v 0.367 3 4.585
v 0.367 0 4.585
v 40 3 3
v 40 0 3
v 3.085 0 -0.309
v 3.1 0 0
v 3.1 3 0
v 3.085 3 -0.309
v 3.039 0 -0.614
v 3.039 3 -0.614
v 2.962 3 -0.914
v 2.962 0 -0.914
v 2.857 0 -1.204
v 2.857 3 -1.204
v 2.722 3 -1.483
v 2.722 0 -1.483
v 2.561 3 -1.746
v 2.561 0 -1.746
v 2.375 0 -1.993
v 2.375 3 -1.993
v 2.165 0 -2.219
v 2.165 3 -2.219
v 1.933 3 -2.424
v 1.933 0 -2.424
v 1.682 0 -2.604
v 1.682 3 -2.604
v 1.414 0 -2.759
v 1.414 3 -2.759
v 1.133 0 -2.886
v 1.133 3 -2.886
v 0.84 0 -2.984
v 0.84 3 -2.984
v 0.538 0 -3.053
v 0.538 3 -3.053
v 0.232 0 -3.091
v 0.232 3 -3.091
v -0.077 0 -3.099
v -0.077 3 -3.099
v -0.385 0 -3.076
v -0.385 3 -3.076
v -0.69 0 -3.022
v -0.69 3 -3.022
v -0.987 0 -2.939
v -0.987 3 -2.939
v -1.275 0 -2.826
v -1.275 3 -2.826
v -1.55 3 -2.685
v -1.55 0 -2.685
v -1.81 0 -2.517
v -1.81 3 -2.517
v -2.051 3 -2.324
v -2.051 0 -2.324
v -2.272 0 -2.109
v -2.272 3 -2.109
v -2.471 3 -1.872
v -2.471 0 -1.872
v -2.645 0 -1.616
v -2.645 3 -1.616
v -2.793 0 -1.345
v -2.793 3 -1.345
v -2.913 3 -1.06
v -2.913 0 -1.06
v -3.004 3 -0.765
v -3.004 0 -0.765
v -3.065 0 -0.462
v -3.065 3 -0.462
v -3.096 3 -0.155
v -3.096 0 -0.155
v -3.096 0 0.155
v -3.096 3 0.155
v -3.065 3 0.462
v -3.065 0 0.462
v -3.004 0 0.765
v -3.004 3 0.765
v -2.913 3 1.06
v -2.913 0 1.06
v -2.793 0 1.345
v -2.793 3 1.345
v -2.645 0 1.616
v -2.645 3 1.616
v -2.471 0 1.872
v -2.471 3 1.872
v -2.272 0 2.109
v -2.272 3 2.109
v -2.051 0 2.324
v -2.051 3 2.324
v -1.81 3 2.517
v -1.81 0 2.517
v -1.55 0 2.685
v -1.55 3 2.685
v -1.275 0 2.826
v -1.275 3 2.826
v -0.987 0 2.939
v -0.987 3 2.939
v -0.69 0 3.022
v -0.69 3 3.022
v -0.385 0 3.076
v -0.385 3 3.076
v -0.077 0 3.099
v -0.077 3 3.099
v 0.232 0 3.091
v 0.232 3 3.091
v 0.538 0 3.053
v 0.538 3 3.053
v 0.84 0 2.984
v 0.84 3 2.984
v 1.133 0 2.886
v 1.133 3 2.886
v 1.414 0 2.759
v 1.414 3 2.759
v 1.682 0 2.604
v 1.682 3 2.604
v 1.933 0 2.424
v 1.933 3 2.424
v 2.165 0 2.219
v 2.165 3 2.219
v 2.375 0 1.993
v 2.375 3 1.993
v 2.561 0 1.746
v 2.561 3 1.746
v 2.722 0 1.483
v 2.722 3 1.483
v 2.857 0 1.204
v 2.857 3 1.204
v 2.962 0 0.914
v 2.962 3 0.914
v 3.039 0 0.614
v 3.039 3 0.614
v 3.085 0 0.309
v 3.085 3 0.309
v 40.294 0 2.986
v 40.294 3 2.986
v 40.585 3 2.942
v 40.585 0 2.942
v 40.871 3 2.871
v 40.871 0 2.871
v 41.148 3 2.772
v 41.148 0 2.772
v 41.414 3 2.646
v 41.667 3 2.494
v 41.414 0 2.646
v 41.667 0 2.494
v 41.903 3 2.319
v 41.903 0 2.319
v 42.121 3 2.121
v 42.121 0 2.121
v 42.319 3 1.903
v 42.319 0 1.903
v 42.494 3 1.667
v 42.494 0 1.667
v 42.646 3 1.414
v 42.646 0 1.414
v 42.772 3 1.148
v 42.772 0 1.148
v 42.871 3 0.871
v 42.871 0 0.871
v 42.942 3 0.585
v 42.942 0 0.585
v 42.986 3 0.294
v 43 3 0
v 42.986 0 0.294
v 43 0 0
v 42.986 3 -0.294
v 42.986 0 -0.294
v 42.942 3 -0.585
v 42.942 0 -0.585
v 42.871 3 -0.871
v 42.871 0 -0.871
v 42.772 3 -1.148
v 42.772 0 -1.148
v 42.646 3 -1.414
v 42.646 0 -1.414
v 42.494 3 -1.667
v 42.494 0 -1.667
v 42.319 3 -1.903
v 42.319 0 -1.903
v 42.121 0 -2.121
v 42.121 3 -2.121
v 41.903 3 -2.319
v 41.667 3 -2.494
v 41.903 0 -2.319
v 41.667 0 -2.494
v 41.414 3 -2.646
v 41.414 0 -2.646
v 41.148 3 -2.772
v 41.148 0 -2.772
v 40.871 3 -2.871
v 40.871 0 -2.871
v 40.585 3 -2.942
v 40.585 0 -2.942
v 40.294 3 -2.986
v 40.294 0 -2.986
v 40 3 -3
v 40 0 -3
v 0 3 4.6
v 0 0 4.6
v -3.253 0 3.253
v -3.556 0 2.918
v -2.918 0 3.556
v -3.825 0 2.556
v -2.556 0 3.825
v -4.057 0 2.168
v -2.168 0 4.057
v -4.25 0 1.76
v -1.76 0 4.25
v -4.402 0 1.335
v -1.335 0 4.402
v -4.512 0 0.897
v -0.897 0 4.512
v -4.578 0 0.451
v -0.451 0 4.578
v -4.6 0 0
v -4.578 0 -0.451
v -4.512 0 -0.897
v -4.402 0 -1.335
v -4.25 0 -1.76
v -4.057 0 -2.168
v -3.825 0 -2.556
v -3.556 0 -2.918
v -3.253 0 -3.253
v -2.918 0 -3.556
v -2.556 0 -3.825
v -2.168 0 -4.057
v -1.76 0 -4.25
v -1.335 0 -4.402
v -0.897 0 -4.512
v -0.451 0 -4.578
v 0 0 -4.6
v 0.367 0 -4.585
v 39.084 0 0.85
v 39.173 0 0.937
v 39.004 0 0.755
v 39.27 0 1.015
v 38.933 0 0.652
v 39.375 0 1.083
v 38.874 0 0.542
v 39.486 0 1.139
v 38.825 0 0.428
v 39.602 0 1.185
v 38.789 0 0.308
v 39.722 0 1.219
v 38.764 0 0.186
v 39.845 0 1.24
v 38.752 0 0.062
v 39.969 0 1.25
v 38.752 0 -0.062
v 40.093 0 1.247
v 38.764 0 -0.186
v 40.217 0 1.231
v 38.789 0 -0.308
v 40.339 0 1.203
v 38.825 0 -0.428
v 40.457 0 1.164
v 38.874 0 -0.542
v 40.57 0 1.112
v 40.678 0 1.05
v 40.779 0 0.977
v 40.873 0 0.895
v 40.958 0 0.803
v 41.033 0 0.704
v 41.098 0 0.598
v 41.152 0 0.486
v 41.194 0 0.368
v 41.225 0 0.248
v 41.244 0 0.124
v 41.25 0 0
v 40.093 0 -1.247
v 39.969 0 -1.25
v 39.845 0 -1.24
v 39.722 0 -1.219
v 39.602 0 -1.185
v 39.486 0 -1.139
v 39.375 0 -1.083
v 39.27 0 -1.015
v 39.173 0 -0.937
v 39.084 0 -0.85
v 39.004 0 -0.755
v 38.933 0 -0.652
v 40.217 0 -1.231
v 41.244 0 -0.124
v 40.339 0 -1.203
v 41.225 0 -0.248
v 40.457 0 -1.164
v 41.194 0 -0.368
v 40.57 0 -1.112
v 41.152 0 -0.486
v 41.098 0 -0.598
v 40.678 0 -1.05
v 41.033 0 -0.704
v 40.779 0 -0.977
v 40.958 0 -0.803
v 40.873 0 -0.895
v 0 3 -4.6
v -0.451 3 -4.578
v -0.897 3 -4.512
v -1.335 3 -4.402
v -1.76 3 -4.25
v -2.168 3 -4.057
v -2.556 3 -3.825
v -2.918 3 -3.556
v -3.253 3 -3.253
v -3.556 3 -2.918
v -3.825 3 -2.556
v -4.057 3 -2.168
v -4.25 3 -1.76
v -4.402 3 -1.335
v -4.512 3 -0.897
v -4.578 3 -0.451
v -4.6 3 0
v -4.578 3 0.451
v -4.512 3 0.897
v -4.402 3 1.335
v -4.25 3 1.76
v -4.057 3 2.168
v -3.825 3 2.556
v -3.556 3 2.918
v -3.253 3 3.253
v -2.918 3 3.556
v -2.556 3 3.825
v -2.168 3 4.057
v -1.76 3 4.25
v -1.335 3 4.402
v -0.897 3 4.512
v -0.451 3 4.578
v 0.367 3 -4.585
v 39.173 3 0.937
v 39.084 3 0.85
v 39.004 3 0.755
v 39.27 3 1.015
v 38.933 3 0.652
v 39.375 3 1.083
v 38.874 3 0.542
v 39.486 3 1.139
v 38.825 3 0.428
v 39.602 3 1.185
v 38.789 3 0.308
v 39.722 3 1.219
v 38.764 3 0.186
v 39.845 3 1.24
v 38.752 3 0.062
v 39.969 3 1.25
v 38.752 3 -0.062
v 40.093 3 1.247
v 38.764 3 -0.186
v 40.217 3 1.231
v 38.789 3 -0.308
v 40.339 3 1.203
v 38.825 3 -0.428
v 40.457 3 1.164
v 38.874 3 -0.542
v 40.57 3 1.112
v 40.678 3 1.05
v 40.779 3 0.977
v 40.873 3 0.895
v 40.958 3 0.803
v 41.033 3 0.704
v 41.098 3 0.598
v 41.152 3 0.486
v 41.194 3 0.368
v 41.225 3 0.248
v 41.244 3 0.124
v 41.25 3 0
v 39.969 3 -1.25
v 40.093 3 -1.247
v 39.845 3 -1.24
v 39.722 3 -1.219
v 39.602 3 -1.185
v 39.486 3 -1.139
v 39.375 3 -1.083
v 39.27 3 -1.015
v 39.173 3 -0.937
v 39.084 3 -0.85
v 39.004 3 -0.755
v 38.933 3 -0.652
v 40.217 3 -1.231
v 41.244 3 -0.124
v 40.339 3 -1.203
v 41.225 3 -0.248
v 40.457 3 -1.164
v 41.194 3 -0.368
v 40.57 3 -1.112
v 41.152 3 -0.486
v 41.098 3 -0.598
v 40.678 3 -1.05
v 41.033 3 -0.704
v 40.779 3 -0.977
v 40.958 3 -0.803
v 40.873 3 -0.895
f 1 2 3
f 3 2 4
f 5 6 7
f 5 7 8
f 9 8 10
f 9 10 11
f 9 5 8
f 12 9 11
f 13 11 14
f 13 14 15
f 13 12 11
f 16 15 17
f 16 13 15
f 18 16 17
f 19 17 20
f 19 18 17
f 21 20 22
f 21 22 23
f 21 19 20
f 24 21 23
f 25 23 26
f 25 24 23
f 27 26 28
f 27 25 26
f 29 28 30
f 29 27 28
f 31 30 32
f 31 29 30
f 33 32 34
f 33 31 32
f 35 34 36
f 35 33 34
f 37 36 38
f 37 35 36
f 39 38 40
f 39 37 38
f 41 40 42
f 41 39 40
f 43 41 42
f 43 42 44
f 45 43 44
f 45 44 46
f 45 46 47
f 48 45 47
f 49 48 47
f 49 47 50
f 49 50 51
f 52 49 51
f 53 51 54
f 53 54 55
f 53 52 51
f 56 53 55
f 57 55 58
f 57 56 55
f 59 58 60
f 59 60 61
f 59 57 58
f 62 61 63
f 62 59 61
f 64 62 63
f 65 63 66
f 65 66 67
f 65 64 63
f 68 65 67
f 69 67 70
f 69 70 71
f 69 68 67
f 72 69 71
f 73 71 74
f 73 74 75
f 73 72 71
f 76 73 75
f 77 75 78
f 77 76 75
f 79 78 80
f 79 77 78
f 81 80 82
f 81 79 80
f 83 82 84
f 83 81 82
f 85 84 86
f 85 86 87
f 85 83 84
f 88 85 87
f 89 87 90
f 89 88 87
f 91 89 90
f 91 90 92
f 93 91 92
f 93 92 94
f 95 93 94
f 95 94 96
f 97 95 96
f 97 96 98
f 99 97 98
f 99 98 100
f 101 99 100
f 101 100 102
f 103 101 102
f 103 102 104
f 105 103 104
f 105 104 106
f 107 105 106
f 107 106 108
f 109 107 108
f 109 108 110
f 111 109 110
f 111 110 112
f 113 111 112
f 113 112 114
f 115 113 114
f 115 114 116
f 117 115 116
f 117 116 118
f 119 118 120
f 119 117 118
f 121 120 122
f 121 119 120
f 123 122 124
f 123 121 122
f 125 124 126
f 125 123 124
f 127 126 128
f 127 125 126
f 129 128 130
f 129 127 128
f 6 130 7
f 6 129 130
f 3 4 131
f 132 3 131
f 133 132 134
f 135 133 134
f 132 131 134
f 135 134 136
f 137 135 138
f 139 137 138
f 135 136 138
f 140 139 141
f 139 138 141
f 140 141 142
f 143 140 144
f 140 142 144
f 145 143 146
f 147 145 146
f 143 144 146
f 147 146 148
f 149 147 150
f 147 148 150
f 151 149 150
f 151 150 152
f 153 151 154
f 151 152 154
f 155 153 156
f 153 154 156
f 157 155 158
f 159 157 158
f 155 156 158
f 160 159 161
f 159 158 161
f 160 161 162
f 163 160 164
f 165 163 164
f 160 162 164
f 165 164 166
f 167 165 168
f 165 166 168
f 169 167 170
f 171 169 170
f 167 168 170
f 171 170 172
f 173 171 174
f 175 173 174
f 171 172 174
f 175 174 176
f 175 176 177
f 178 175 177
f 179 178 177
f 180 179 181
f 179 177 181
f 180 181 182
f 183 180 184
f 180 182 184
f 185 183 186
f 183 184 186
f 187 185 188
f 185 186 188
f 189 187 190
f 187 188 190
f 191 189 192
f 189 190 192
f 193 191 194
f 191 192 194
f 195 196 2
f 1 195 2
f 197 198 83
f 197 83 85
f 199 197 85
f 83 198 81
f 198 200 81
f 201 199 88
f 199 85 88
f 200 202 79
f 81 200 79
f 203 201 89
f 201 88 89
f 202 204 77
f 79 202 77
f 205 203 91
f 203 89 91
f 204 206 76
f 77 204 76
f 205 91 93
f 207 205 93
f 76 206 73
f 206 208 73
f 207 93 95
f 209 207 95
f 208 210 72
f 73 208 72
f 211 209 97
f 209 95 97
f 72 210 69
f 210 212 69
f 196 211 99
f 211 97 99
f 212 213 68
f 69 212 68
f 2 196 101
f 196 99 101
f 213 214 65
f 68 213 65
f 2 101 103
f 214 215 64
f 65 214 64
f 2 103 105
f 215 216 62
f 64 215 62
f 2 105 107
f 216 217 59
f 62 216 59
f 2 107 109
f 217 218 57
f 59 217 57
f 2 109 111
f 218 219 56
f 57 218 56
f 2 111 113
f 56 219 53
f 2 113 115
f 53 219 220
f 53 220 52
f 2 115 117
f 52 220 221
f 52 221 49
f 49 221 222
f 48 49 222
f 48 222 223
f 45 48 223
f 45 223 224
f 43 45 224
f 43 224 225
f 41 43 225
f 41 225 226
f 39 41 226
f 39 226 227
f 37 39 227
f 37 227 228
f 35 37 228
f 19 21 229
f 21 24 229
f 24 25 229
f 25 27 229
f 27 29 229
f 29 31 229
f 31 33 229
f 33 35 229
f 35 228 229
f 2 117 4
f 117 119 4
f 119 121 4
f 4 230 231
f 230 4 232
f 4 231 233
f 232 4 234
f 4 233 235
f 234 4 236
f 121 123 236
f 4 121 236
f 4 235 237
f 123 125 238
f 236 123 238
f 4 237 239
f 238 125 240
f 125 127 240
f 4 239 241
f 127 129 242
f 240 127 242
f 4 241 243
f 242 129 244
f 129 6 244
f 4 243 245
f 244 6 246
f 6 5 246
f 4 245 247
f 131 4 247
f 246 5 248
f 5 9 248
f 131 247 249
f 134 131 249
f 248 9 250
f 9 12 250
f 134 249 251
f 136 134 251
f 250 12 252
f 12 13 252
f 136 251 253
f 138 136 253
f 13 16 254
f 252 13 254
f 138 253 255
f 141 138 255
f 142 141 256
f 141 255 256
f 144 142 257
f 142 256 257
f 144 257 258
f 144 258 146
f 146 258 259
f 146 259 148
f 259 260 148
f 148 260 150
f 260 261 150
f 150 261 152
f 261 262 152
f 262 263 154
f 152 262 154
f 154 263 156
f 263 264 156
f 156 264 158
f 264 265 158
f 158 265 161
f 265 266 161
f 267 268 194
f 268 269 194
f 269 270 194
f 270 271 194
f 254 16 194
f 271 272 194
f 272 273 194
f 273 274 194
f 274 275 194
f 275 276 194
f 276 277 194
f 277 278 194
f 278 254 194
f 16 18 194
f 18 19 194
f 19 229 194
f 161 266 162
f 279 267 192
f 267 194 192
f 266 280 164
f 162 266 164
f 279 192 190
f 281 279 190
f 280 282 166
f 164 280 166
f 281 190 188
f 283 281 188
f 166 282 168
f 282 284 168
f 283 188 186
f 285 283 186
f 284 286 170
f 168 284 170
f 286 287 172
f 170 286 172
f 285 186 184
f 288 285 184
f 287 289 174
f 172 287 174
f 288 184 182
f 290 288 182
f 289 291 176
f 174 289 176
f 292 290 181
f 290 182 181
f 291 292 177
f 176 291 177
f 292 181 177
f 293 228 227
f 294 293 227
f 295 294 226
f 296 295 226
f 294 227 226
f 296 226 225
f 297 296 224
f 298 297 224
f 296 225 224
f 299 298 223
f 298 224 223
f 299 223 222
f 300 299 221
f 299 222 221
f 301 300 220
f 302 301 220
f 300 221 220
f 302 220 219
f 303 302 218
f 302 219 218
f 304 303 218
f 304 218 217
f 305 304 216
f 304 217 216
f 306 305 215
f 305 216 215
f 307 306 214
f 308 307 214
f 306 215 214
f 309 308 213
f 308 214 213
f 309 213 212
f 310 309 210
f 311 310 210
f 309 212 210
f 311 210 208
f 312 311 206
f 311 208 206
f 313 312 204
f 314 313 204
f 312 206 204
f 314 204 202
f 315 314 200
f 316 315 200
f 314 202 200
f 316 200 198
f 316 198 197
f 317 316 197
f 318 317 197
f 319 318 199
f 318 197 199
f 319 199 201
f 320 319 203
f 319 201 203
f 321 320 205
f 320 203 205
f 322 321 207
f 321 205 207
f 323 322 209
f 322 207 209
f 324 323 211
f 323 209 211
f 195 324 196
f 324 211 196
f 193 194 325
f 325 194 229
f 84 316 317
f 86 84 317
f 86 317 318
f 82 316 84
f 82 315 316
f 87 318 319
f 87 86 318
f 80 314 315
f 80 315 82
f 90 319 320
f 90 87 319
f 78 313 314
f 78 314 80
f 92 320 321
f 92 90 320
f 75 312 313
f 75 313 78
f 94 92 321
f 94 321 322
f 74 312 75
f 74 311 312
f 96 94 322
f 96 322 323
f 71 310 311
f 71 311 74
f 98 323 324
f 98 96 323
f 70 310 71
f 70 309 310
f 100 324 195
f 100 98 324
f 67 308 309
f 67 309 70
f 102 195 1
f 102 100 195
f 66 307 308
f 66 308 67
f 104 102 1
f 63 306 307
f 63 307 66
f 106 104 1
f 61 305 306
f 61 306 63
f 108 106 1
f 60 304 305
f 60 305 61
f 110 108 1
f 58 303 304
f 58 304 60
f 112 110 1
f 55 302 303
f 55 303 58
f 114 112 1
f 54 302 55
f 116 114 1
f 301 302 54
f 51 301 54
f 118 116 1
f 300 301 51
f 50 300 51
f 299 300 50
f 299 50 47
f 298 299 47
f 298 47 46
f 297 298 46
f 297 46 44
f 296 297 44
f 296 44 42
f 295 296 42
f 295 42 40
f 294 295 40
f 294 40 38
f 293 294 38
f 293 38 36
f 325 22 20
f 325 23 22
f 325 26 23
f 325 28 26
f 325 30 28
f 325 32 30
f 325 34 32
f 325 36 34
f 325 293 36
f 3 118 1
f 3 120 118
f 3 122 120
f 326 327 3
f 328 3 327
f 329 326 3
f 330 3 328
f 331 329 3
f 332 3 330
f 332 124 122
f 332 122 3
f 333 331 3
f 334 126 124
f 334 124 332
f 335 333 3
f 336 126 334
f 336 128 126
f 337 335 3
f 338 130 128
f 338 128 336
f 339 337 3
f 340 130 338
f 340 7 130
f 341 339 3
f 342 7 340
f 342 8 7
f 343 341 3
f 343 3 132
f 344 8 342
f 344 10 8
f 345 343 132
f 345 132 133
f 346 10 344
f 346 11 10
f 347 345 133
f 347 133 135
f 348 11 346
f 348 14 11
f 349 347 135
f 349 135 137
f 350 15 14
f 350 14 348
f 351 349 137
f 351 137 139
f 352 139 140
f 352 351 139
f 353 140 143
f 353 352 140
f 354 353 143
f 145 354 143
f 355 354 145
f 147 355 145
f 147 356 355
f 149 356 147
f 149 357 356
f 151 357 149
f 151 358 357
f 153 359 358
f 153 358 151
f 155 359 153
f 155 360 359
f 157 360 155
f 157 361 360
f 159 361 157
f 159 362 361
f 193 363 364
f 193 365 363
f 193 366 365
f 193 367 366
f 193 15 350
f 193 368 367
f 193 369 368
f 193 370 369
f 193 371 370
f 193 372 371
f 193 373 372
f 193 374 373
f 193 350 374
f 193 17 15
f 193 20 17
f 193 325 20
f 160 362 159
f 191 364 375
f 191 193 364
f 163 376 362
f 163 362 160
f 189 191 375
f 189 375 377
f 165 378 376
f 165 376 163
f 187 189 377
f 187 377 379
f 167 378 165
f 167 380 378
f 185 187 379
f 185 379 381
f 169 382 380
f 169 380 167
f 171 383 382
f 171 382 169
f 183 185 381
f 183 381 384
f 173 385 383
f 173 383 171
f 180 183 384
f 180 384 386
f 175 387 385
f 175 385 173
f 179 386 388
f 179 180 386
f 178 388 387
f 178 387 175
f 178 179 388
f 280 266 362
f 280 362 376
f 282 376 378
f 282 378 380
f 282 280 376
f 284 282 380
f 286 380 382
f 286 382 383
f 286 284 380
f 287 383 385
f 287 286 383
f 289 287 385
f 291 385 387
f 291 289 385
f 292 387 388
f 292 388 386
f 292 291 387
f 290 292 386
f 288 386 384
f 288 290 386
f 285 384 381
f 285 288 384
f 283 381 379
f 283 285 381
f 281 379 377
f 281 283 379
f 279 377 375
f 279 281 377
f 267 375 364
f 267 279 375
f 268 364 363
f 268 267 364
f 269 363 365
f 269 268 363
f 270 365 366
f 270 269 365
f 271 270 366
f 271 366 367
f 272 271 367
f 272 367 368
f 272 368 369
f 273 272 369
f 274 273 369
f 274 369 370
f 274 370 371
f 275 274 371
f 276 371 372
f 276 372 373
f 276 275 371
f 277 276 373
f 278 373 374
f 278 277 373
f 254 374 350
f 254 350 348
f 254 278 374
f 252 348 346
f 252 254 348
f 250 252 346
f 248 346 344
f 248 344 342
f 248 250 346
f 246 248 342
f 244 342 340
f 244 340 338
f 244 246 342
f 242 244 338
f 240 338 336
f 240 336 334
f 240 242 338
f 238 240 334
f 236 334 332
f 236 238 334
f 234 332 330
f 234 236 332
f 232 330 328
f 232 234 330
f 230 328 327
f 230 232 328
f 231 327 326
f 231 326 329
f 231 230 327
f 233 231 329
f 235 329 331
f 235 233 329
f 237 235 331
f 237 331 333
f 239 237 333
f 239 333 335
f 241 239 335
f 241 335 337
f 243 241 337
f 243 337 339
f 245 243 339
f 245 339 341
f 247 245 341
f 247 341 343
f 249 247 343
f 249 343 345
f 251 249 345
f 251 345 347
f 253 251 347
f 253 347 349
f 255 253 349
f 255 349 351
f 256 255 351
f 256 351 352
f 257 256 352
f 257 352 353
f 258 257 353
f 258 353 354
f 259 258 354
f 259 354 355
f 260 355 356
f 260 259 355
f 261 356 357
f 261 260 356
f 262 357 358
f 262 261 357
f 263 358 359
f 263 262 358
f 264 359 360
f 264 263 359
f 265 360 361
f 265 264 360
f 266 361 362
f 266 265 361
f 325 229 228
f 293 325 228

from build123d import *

# Parameters (mm, degrees)
SKETCH1_R           = 3.1
SKETCH1_R_2         = 3
SKETCH1_R_3         = 1.25
BOSS_EXTRUDE1_DEPTH = 3


with BuildPart() as part:
    # Sketch1 → Boss-Extrude1 (new body)
    with BuildSketch(Plane(origin=(0, 0, 0), x_dir=(1, 0, 0), z_dir=(0, 1, 0))):
        with BuildLine():
            Line((40, 3), (0.367412141, 4.585303514))
            ThreePointArc((0.367412141, 4.585303514), (3.380095845, 3.120088473), (4.6, 0))
            ThreePointArc((4.6, 0), (3.380095845, -3.120088473), (0.367412141, -4.585303514))
            Line((0.367412141, -4.585303514), (40, -3))
            ThreePointArc((40, -3), (37, 0), (40, 3))
        make_face()
        with BuildLine():
            Line((0.367412141, 4.585303514), (0, 4.6))
            ThreePointArc((0, 4.6), (-4.6, 0), (0, -4.6))
            Line((0, -4.6), (0.367412141, -4.585303514))
            ThreePointArc((0.367412141, -4.585303514), (3.380095845, -3.120088473), (4.6, 0))
            ThreePointArc((4.6, 0), (3.380095845, 3.120088473), (0.367412141, 4.585303514))
        make_face()
        Circle(SKETCH1_R, mode=Mode.SUBTRACT)
        with Locations((40, 0)):
            Circle(SKETCH1_R_2)
        with Locations((40, 0)):
            Circle(SKETCH1_R_3, mode=Mode.SUBTRACT)
    extrude(amount=BOSS_EXTRUDE1_DEPTH)


solid = part.part
